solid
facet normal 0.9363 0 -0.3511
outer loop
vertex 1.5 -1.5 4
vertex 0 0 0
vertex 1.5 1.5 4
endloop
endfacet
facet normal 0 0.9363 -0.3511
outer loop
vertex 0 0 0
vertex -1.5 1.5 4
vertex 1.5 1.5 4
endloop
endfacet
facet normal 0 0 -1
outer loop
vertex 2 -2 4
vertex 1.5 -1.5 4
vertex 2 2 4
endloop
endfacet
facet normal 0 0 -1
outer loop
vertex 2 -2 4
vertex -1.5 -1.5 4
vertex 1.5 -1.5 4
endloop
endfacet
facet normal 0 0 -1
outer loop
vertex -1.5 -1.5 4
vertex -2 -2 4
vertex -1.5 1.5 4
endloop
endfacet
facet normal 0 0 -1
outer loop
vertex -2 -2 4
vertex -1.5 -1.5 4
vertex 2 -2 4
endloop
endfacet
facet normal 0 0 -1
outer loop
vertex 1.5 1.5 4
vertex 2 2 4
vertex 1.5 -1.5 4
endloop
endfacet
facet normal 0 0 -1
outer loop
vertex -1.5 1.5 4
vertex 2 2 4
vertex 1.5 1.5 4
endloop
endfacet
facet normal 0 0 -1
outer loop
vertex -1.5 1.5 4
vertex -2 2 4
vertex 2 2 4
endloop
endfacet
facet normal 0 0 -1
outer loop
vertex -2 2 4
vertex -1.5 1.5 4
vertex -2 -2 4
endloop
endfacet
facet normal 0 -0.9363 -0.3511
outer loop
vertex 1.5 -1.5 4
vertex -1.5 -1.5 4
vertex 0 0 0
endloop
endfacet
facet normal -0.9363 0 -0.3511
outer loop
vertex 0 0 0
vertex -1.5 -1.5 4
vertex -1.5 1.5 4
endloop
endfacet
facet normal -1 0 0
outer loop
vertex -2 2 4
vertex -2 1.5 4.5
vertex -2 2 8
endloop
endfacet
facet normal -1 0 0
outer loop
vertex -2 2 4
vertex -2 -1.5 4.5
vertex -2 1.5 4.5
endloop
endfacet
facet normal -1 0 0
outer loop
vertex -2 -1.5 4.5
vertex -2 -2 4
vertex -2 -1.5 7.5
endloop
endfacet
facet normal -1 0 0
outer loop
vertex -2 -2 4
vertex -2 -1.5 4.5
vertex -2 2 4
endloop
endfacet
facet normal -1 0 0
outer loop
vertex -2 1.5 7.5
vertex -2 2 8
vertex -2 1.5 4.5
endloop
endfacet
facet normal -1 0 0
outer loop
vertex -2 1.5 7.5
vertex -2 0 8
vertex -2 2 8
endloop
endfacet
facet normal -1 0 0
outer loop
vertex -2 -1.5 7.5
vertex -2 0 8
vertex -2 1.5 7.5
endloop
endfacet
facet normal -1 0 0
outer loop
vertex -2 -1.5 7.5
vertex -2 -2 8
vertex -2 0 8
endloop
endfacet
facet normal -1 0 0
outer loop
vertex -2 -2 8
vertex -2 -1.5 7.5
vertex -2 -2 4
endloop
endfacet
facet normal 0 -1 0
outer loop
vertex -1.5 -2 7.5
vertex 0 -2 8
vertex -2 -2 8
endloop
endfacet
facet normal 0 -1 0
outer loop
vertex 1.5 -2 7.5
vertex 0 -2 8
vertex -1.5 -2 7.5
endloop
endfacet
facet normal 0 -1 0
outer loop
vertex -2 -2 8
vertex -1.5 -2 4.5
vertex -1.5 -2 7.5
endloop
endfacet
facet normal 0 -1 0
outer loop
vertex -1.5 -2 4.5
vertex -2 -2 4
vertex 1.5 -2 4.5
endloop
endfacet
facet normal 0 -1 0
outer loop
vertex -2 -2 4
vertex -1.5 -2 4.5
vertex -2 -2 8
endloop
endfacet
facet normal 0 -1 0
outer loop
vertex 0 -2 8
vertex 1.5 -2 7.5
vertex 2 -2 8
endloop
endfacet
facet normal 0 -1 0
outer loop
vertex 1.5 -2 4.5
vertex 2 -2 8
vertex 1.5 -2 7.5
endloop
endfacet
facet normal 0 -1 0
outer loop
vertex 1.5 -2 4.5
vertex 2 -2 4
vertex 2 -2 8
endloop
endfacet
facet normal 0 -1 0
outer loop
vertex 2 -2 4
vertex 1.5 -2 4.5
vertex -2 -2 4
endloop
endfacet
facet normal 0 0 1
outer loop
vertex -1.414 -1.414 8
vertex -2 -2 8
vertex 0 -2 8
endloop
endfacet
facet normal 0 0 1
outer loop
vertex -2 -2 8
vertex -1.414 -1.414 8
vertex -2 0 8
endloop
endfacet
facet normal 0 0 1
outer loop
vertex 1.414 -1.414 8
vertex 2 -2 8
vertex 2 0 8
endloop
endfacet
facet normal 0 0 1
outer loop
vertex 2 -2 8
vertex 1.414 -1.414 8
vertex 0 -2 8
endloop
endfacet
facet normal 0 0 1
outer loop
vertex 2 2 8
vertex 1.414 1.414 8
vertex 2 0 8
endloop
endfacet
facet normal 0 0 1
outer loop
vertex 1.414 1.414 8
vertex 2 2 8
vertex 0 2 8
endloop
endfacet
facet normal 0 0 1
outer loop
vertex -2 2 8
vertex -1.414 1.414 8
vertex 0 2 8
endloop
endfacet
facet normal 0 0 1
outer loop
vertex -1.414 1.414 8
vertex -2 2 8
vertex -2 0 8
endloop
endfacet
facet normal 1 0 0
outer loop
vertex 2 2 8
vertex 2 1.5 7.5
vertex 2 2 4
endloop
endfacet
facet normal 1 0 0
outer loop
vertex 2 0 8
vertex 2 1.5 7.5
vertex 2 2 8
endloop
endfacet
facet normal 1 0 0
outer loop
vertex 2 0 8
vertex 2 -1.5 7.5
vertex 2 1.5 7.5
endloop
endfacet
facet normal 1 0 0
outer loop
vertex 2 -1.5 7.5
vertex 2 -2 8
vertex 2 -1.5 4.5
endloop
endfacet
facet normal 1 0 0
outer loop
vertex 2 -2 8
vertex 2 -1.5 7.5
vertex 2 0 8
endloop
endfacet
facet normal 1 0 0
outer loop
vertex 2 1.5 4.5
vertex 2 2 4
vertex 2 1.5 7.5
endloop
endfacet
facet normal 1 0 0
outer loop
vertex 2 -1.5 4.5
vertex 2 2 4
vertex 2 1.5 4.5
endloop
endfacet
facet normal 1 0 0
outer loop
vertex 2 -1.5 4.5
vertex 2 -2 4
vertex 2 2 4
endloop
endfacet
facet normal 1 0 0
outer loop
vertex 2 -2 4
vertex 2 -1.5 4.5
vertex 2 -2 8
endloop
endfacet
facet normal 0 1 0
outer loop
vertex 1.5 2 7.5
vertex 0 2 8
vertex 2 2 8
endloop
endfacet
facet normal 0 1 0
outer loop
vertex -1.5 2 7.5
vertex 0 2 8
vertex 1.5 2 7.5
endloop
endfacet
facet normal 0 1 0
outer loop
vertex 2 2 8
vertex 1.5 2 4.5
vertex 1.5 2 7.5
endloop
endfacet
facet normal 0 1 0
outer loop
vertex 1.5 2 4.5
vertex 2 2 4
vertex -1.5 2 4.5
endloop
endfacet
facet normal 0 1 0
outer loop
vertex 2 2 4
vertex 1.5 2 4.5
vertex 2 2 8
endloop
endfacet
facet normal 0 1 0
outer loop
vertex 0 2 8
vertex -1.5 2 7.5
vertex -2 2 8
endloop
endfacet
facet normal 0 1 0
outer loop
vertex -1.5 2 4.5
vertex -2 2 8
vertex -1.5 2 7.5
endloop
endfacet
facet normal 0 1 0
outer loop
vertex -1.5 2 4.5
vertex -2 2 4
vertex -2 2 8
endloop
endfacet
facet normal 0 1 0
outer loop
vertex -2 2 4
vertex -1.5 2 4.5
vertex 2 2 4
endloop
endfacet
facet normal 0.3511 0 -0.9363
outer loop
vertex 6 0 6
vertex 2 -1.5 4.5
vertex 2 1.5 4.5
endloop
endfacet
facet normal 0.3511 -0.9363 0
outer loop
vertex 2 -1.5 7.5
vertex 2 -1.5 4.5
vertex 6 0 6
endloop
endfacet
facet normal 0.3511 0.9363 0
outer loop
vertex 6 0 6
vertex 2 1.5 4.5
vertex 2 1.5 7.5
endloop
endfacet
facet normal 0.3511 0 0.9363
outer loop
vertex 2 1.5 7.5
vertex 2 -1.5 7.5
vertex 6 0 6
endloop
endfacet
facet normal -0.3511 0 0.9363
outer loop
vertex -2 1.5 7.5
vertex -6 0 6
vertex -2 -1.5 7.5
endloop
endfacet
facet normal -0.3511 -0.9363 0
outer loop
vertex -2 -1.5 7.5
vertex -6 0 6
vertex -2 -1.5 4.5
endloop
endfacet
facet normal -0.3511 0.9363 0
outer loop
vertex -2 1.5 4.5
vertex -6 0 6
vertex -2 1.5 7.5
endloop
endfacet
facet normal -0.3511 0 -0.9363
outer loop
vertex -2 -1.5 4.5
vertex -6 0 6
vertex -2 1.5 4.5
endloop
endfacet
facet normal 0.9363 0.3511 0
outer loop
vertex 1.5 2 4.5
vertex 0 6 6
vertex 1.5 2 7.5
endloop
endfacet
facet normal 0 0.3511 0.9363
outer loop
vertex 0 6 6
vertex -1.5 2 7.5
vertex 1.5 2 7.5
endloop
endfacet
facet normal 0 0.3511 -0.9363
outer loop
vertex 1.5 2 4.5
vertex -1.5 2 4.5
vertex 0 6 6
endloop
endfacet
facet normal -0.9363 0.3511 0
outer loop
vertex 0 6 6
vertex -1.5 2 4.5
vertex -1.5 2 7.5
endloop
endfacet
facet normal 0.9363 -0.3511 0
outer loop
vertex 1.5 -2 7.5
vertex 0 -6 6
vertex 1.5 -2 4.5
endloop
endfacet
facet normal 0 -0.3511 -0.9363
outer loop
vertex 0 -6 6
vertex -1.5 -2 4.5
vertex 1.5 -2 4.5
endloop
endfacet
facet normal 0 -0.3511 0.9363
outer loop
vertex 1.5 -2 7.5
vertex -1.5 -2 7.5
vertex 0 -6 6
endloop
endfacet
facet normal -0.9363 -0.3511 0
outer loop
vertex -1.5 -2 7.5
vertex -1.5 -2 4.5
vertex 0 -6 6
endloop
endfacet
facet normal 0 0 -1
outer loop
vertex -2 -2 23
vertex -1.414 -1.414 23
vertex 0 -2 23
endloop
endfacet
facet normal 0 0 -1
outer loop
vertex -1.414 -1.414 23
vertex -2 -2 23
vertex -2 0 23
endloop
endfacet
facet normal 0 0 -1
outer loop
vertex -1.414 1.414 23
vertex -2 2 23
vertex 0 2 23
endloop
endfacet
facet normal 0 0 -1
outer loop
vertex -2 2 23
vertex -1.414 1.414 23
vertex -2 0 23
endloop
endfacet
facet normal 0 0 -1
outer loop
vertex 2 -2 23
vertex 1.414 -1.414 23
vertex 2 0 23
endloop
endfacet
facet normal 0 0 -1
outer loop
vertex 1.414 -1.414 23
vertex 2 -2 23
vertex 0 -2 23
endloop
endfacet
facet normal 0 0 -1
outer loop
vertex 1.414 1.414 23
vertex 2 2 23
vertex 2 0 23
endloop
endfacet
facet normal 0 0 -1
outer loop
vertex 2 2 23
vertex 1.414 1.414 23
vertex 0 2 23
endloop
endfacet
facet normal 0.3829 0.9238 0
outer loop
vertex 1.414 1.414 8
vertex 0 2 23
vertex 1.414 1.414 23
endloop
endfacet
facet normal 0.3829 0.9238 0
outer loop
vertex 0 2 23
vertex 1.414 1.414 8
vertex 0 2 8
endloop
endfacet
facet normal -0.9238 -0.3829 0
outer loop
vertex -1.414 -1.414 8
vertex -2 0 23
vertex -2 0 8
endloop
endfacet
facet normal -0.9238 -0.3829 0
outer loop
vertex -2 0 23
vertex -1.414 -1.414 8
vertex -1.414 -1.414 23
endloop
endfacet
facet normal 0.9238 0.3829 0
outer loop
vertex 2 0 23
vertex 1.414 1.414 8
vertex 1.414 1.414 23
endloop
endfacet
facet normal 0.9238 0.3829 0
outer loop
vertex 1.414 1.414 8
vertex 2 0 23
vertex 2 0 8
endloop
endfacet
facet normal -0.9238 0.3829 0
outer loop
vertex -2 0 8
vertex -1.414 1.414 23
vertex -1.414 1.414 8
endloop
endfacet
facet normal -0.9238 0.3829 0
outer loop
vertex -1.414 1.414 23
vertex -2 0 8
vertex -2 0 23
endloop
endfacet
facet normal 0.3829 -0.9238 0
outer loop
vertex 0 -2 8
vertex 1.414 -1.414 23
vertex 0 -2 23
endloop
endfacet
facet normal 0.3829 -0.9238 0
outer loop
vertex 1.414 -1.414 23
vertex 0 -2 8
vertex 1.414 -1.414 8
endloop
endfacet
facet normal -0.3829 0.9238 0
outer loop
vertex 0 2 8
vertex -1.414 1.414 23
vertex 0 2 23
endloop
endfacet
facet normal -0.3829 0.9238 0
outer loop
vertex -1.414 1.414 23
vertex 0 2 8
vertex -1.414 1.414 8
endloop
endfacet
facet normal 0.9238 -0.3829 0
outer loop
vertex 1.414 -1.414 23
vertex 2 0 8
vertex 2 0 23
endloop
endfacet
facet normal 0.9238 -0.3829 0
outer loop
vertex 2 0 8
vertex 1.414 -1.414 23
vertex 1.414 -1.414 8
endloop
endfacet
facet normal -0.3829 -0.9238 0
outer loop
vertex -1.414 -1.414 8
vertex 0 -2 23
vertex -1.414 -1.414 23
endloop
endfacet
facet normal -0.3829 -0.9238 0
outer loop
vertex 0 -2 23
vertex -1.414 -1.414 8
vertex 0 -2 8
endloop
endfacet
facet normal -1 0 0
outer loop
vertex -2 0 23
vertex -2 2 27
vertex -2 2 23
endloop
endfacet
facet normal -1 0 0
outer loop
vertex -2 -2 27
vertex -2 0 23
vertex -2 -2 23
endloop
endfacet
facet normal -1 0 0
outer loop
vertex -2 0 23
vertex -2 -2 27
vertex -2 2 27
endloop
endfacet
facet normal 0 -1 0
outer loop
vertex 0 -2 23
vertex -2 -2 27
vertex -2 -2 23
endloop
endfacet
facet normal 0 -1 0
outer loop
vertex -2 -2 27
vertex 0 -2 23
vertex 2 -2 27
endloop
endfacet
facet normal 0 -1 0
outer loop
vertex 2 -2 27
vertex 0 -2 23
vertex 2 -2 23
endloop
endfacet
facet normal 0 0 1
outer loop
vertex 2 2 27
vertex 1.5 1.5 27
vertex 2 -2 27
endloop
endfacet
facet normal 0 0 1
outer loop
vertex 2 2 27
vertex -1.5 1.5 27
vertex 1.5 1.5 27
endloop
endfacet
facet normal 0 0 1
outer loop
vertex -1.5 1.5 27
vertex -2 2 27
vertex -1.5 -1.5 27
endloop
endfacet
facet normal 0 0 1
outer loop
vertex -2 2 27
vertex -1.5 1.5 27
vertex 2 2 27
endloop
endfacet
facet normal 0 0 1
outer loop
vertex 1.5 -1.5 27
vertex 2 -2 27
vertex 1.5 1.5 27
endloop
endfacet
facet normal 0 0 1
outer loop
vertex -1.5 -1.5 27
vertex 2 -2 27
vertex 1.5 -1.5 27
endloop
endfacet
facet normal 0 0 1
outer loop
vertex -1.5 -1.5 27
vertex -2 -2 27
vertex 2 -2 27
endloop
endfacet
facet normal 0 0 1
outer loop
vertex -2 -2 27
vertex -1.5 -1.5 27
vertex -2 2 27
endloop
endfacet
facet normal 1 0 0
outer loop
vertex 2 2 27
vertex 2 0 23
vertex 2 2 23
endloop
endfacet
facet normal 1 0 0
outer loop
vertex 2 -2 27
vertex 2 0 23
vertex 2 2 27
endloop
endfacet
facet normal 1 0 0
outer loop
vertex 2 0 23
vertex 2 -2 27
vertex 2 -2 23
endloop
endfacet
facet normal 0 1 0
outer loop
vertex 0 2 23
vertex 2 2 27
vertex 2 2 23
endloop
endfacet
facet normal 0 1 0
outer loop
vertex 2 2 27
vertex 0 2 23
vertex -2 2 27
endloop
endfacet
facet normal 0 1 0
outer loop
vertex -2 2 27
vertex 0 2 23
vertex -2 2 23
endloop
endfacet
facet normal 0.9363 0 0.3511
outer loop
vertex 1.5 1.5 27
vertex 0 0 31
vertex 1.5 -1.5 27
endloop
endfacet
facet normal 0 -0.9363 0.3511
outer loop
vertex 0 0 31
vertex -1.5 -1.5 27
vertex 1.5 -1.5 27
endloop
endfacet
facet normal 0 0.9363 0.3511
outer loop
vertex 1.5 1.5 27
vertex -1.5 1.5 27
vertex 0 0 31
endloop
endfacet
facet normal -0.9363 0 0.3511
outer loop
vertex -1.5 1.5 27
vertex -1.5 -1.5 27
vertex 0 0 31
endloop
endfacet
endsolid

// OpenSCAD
/*
--------------------------------------------------------------------------------
*/
module prism(x, y, z, l, w, h, xRot, yRot, zRot, color)
{
color(color)
    translate([x, y, z])
        rotate([xRot, yRot, zRot])
            polyhedron( points=[
                    [0,0,0], [l,0,0], [l,w,0],
                    [0,w,0], [0,w,h], [l,w,h]],
                        faces=[
                    [0,1,2,3],[5,4,3,2],[0,4,5,1],
                    [0,3,4],[5,2,1]]
    );
}
module pyramid(x, y, z, l, w, h, xRot, yRot, zRot, color)
{
color(color)
    translate([x, y, z])
        rotate([xRot, yRot, zRot])
            polyhedron( points=[
                    [l/2, w/2, 0], [l/2, -w/2, 0],
                    [-l/2, -w/2,0], [-l/2, w/2, 0],
                    [0, 0, h]],
                        faces=[
                    [0,1,4],[1,2,4],[2,3,4],[3,0,4],
                    [1,0,3],[2,1,3]]
    );
}
module diamond(x, y, z, l, w, h, xRot, yRot, zRot, color)
{
color(color)
    translate([x, y, z])
        rotate([xRot, yRot, zRot])
            polyhedron( points=[
                    [l/2, 0, 0], [0, w/2, 0],
                    [-l/2, 0,0], [0, -w/2, 0],
                    [0, 0, h]],
                        faces=[
                    [0,1,4],[1,2,4],[2,3,4],[3,0,4],
                    [1,0,3],[2,1,3]]
    );
}
module cylinder(x, y, z, r, h, xRot, yRot, zRot, color)
{
color(color)
    translate([x, y, z])
        rotate([xRot, yRot, zRot])
            polyhedron( points=[
                    [0,0,0], [0,0,h],
                    [r*cos(0), r*sin(0), 0],
                    [r*cos(0), r*sin(0), h],
                    [r*cos(45), r*sin(45), 0],
                    [r*cos(45), r*sin(45), h],
                    [r*cos(90), r*sin(90), 0],
                    [r*cos(90), r*sin(90), h],
                    [r*cos(135), r*sin(135), 0],
                    [r*cos(135), r*sin(135), h],
                    [r*cos(180), r*sin(180), 0],
                    [r*cos(180), r*sin(180), h],
                    [r*cos(225), r*sin(225), 0],
                    [r*cos(225), r*sin(225), h],
                    [r*cos(270), r*sin(270), 0],
                    [r*cos(270), r*sin(270), h],
                    [r*cos(315), r*sin(315), 0],
                    [r*cos(315), r*sin(315), h]],
                        faces=[
                    [2,3,4],[0,2,4],[4,3,5],[3,1,5],
                    [4,5,6],[0,4,6],[6,5,7],[5,1,7],
                    [6,7,8],[0,6,8],[8,7,9],[7,1,9],
                    [8,9,10],[0,8,10],[10,9,11],[9,1,11],
                    [10,11,12],[0,10,12],[12,11,13],[11,1,13],
                    [12,13,14],[0,12,14],[14,13,15],[13,1,15],
                    [14,15,16],[0,14,16],[16,15,17],[15,1,17],
                    [16,17,2],[0,16,2],[2,17,3],[17,1,3]]
    );
}
module rectangle(x, y, z, l, w, h, xRot, yRot, zRot, color)
{
color(color)
    translate([x, y, z])
        rotate([xRot, yRot, zRot])
            polyhedron( points = [
                    [-l/2, -w/2, 0],
                    [-l/2, -w/2, h],
                    [-l/2, w/2, 0],
                    [-l/2, w/2, h],
                    [l/2, -w/2, 0],
                    [l/2, -w/2, h],
                    [l/2, w/2, 0],
                    [l/2, w/2, h]],
                        faces = [
                    [0,1,2],[0,4,1],[0,2,4],
                    [3,2,1],[5,1,4],[1,5,3],
                    [6,4,2],[6,5,4],[2,3,6],
                    [7,5,6],[6,3,7],[7,3,5]]
    );
}
metal_color = "red";
handle_color = "black";
xStart = 0;
yStart = 0;
zStart = 0;

// botom of handle
hndl_pyr_l = 3;
hndl_pyr_w = 3;
hndl_pyr_h = 4;
pyr1_hndl = [xStart,yStart,zStart,hndl_pyr_l,hndl_pyr_w,hndl_pyr_h,
             180,0,0];
pyramid(pyr1_hndl[0],pyr1_hndl[1],pyr1_hndl[2]+pyr1_hndl[5],
        pyr1_hndl[3],pyr1_hndl[4],pyr1_hndl[5],
        pyr1_hndl[6],pyr1_hndl[7],pyr1_hndl[8], metal_color);
box_hndl = [xStart, yStart, pyr1_hndl[2]+pyr1_hndl[5],4,4,4,0,0,0];
rectangle(box_hndl[0],box_hndl[1],box_hndl[2],
          box_hndl[3],box_hndl[4],box_hndl[5],
          box_hndl[6],box_hndl[7],box_hndl[8], metal_color);
pyr2_hndl = [box_hndl[0]+box_hndl[3]/2,box_hndl[1],box_hndl[2]+box_hndl[2]/2,
             hndl_pyr_l,hndl_pyr_w,hndl_pyr_h,
             0,90,0];
pyramid(pyr2_hndl[0],pyr2_hndl[1],pyr2_hndl[2],
        pyr2_hndl[3],pyr2_hndl[4],pyr2_hndl[5],
        pyr2_hndl[6],pyr2_hndl[7],pyr2_hndl[8], metal_color);
pyr3_hndl = [box_hndl[0]-box_hndl[3]/2,box_hndl[1],box_hndl[2]+box_hndl[2]/2,
             hndl_pyr_l,hndl_pyr_w,hndl_pyr_h,
             0,270,0];
pyramid(pyr3_hndl[0],pyr3_hndl[1],pyr3_hndl[2],
        pyr3_hndl[3],pyr3_hndl[4],pyr3_hndl[5],
        pyr3_hndl[6],pyr3_hndl[7],pyr3_hndl[8], metal_color);
pyr4_hndl = [box_hndl[0],box_hndl[1]+box_hndl[3]/2,box_hndl[2]+box_hndl[2]/2,
             hndl_pyr_l,hndl_pyr_w,hndl_pyr_h,
             270,0,0];
pyramid(pyr4_hndl[0],pyr4_hndl[1],pyr4_hndl[2],
        pyr4_hndl[3],pyr4_hndl[4],pyr4_hndl[5],
        pyr4_hndl[6],pyr4_hndl[7],pyr4_hndl[8], metal_color);
pyr5_hndl = [box_hndl[0],box_hndl[1]-box_hndl[3]/2,box_hndl[2]+box_hndl[2]/2,
             hndl_pyr_l,hndl_pyr_w,hndl_pyr_h,
             90,0,0];
pyramid(pyr5_hndl[0],pyr5_hndl[1],pyr5_hndl[2],
        pyr5_hndl[3],pyr5_hndl[4],pyr5_hndl[5],
        pyr5_hndl[6],pyr5_hndl[7],pyr5_hndl[8], metal_color);
// shaft of handle
cyl1_hndl = [xStart,yStart,box_hndl[2]+box_hndl[2],
             2,15,0,0,0];
cylinder(cyl1_hndl[0],cyl1_hndl[1],cyl1_hndl[2],cyl1_hndl[3],cyl1_hndl[4],cyl1_hndl[5],cyl1_hndl[6],cyl1_hndl[7],handle_color);
// top of handle
box_hndl_top = [xStart, yStart, cyl1_hndl[2]+cyl1_hndl[4],4,4,4,0,0,0];
rectangle(box_hndl_top[0],box_hndl_top[1],box_hndl_top[2],
          box_hndl_top[3],box_hndl_top[4],box_hndl_top[5],
          box_hndl_top[6],box_hndl_top[7],box_hndl_top[8], metal_color);
pyr1_hndl_top = [box_hndl_top[0],box_hndl_top[1],
                 box_hndl_top[2]+box_hndl_top[5],
                 hndl_pyr_l,hndl_pyr_w,hndl_pyr_h,
                 0,0,0];
pyramid(pyr1_hndl_top[0],pyr1_hndl_top[1],pyr1_hndl_top[2],
        pyr1_hndl_top[3],pyr1_hndl_top[4],pyr1_hndl_top[5],
        pyr1_hndl_top[6],pyr1_hndl_top[7],pyr1_hndl_top[8], metal_color);
/*
rectangle(0,0,0,10,10,10,0,0,0,"red");
diamond(-20,0,0,10,10,10,0,0,0,"red");
cylinder(-20,-20,0,10,10,0,0,0,"red");
prism(20,20,0,10,10,10,0,0,0,"red");
pyramid(20,0,0,10,10,10,0,0,0,"red");
*/


echo(version=version());
